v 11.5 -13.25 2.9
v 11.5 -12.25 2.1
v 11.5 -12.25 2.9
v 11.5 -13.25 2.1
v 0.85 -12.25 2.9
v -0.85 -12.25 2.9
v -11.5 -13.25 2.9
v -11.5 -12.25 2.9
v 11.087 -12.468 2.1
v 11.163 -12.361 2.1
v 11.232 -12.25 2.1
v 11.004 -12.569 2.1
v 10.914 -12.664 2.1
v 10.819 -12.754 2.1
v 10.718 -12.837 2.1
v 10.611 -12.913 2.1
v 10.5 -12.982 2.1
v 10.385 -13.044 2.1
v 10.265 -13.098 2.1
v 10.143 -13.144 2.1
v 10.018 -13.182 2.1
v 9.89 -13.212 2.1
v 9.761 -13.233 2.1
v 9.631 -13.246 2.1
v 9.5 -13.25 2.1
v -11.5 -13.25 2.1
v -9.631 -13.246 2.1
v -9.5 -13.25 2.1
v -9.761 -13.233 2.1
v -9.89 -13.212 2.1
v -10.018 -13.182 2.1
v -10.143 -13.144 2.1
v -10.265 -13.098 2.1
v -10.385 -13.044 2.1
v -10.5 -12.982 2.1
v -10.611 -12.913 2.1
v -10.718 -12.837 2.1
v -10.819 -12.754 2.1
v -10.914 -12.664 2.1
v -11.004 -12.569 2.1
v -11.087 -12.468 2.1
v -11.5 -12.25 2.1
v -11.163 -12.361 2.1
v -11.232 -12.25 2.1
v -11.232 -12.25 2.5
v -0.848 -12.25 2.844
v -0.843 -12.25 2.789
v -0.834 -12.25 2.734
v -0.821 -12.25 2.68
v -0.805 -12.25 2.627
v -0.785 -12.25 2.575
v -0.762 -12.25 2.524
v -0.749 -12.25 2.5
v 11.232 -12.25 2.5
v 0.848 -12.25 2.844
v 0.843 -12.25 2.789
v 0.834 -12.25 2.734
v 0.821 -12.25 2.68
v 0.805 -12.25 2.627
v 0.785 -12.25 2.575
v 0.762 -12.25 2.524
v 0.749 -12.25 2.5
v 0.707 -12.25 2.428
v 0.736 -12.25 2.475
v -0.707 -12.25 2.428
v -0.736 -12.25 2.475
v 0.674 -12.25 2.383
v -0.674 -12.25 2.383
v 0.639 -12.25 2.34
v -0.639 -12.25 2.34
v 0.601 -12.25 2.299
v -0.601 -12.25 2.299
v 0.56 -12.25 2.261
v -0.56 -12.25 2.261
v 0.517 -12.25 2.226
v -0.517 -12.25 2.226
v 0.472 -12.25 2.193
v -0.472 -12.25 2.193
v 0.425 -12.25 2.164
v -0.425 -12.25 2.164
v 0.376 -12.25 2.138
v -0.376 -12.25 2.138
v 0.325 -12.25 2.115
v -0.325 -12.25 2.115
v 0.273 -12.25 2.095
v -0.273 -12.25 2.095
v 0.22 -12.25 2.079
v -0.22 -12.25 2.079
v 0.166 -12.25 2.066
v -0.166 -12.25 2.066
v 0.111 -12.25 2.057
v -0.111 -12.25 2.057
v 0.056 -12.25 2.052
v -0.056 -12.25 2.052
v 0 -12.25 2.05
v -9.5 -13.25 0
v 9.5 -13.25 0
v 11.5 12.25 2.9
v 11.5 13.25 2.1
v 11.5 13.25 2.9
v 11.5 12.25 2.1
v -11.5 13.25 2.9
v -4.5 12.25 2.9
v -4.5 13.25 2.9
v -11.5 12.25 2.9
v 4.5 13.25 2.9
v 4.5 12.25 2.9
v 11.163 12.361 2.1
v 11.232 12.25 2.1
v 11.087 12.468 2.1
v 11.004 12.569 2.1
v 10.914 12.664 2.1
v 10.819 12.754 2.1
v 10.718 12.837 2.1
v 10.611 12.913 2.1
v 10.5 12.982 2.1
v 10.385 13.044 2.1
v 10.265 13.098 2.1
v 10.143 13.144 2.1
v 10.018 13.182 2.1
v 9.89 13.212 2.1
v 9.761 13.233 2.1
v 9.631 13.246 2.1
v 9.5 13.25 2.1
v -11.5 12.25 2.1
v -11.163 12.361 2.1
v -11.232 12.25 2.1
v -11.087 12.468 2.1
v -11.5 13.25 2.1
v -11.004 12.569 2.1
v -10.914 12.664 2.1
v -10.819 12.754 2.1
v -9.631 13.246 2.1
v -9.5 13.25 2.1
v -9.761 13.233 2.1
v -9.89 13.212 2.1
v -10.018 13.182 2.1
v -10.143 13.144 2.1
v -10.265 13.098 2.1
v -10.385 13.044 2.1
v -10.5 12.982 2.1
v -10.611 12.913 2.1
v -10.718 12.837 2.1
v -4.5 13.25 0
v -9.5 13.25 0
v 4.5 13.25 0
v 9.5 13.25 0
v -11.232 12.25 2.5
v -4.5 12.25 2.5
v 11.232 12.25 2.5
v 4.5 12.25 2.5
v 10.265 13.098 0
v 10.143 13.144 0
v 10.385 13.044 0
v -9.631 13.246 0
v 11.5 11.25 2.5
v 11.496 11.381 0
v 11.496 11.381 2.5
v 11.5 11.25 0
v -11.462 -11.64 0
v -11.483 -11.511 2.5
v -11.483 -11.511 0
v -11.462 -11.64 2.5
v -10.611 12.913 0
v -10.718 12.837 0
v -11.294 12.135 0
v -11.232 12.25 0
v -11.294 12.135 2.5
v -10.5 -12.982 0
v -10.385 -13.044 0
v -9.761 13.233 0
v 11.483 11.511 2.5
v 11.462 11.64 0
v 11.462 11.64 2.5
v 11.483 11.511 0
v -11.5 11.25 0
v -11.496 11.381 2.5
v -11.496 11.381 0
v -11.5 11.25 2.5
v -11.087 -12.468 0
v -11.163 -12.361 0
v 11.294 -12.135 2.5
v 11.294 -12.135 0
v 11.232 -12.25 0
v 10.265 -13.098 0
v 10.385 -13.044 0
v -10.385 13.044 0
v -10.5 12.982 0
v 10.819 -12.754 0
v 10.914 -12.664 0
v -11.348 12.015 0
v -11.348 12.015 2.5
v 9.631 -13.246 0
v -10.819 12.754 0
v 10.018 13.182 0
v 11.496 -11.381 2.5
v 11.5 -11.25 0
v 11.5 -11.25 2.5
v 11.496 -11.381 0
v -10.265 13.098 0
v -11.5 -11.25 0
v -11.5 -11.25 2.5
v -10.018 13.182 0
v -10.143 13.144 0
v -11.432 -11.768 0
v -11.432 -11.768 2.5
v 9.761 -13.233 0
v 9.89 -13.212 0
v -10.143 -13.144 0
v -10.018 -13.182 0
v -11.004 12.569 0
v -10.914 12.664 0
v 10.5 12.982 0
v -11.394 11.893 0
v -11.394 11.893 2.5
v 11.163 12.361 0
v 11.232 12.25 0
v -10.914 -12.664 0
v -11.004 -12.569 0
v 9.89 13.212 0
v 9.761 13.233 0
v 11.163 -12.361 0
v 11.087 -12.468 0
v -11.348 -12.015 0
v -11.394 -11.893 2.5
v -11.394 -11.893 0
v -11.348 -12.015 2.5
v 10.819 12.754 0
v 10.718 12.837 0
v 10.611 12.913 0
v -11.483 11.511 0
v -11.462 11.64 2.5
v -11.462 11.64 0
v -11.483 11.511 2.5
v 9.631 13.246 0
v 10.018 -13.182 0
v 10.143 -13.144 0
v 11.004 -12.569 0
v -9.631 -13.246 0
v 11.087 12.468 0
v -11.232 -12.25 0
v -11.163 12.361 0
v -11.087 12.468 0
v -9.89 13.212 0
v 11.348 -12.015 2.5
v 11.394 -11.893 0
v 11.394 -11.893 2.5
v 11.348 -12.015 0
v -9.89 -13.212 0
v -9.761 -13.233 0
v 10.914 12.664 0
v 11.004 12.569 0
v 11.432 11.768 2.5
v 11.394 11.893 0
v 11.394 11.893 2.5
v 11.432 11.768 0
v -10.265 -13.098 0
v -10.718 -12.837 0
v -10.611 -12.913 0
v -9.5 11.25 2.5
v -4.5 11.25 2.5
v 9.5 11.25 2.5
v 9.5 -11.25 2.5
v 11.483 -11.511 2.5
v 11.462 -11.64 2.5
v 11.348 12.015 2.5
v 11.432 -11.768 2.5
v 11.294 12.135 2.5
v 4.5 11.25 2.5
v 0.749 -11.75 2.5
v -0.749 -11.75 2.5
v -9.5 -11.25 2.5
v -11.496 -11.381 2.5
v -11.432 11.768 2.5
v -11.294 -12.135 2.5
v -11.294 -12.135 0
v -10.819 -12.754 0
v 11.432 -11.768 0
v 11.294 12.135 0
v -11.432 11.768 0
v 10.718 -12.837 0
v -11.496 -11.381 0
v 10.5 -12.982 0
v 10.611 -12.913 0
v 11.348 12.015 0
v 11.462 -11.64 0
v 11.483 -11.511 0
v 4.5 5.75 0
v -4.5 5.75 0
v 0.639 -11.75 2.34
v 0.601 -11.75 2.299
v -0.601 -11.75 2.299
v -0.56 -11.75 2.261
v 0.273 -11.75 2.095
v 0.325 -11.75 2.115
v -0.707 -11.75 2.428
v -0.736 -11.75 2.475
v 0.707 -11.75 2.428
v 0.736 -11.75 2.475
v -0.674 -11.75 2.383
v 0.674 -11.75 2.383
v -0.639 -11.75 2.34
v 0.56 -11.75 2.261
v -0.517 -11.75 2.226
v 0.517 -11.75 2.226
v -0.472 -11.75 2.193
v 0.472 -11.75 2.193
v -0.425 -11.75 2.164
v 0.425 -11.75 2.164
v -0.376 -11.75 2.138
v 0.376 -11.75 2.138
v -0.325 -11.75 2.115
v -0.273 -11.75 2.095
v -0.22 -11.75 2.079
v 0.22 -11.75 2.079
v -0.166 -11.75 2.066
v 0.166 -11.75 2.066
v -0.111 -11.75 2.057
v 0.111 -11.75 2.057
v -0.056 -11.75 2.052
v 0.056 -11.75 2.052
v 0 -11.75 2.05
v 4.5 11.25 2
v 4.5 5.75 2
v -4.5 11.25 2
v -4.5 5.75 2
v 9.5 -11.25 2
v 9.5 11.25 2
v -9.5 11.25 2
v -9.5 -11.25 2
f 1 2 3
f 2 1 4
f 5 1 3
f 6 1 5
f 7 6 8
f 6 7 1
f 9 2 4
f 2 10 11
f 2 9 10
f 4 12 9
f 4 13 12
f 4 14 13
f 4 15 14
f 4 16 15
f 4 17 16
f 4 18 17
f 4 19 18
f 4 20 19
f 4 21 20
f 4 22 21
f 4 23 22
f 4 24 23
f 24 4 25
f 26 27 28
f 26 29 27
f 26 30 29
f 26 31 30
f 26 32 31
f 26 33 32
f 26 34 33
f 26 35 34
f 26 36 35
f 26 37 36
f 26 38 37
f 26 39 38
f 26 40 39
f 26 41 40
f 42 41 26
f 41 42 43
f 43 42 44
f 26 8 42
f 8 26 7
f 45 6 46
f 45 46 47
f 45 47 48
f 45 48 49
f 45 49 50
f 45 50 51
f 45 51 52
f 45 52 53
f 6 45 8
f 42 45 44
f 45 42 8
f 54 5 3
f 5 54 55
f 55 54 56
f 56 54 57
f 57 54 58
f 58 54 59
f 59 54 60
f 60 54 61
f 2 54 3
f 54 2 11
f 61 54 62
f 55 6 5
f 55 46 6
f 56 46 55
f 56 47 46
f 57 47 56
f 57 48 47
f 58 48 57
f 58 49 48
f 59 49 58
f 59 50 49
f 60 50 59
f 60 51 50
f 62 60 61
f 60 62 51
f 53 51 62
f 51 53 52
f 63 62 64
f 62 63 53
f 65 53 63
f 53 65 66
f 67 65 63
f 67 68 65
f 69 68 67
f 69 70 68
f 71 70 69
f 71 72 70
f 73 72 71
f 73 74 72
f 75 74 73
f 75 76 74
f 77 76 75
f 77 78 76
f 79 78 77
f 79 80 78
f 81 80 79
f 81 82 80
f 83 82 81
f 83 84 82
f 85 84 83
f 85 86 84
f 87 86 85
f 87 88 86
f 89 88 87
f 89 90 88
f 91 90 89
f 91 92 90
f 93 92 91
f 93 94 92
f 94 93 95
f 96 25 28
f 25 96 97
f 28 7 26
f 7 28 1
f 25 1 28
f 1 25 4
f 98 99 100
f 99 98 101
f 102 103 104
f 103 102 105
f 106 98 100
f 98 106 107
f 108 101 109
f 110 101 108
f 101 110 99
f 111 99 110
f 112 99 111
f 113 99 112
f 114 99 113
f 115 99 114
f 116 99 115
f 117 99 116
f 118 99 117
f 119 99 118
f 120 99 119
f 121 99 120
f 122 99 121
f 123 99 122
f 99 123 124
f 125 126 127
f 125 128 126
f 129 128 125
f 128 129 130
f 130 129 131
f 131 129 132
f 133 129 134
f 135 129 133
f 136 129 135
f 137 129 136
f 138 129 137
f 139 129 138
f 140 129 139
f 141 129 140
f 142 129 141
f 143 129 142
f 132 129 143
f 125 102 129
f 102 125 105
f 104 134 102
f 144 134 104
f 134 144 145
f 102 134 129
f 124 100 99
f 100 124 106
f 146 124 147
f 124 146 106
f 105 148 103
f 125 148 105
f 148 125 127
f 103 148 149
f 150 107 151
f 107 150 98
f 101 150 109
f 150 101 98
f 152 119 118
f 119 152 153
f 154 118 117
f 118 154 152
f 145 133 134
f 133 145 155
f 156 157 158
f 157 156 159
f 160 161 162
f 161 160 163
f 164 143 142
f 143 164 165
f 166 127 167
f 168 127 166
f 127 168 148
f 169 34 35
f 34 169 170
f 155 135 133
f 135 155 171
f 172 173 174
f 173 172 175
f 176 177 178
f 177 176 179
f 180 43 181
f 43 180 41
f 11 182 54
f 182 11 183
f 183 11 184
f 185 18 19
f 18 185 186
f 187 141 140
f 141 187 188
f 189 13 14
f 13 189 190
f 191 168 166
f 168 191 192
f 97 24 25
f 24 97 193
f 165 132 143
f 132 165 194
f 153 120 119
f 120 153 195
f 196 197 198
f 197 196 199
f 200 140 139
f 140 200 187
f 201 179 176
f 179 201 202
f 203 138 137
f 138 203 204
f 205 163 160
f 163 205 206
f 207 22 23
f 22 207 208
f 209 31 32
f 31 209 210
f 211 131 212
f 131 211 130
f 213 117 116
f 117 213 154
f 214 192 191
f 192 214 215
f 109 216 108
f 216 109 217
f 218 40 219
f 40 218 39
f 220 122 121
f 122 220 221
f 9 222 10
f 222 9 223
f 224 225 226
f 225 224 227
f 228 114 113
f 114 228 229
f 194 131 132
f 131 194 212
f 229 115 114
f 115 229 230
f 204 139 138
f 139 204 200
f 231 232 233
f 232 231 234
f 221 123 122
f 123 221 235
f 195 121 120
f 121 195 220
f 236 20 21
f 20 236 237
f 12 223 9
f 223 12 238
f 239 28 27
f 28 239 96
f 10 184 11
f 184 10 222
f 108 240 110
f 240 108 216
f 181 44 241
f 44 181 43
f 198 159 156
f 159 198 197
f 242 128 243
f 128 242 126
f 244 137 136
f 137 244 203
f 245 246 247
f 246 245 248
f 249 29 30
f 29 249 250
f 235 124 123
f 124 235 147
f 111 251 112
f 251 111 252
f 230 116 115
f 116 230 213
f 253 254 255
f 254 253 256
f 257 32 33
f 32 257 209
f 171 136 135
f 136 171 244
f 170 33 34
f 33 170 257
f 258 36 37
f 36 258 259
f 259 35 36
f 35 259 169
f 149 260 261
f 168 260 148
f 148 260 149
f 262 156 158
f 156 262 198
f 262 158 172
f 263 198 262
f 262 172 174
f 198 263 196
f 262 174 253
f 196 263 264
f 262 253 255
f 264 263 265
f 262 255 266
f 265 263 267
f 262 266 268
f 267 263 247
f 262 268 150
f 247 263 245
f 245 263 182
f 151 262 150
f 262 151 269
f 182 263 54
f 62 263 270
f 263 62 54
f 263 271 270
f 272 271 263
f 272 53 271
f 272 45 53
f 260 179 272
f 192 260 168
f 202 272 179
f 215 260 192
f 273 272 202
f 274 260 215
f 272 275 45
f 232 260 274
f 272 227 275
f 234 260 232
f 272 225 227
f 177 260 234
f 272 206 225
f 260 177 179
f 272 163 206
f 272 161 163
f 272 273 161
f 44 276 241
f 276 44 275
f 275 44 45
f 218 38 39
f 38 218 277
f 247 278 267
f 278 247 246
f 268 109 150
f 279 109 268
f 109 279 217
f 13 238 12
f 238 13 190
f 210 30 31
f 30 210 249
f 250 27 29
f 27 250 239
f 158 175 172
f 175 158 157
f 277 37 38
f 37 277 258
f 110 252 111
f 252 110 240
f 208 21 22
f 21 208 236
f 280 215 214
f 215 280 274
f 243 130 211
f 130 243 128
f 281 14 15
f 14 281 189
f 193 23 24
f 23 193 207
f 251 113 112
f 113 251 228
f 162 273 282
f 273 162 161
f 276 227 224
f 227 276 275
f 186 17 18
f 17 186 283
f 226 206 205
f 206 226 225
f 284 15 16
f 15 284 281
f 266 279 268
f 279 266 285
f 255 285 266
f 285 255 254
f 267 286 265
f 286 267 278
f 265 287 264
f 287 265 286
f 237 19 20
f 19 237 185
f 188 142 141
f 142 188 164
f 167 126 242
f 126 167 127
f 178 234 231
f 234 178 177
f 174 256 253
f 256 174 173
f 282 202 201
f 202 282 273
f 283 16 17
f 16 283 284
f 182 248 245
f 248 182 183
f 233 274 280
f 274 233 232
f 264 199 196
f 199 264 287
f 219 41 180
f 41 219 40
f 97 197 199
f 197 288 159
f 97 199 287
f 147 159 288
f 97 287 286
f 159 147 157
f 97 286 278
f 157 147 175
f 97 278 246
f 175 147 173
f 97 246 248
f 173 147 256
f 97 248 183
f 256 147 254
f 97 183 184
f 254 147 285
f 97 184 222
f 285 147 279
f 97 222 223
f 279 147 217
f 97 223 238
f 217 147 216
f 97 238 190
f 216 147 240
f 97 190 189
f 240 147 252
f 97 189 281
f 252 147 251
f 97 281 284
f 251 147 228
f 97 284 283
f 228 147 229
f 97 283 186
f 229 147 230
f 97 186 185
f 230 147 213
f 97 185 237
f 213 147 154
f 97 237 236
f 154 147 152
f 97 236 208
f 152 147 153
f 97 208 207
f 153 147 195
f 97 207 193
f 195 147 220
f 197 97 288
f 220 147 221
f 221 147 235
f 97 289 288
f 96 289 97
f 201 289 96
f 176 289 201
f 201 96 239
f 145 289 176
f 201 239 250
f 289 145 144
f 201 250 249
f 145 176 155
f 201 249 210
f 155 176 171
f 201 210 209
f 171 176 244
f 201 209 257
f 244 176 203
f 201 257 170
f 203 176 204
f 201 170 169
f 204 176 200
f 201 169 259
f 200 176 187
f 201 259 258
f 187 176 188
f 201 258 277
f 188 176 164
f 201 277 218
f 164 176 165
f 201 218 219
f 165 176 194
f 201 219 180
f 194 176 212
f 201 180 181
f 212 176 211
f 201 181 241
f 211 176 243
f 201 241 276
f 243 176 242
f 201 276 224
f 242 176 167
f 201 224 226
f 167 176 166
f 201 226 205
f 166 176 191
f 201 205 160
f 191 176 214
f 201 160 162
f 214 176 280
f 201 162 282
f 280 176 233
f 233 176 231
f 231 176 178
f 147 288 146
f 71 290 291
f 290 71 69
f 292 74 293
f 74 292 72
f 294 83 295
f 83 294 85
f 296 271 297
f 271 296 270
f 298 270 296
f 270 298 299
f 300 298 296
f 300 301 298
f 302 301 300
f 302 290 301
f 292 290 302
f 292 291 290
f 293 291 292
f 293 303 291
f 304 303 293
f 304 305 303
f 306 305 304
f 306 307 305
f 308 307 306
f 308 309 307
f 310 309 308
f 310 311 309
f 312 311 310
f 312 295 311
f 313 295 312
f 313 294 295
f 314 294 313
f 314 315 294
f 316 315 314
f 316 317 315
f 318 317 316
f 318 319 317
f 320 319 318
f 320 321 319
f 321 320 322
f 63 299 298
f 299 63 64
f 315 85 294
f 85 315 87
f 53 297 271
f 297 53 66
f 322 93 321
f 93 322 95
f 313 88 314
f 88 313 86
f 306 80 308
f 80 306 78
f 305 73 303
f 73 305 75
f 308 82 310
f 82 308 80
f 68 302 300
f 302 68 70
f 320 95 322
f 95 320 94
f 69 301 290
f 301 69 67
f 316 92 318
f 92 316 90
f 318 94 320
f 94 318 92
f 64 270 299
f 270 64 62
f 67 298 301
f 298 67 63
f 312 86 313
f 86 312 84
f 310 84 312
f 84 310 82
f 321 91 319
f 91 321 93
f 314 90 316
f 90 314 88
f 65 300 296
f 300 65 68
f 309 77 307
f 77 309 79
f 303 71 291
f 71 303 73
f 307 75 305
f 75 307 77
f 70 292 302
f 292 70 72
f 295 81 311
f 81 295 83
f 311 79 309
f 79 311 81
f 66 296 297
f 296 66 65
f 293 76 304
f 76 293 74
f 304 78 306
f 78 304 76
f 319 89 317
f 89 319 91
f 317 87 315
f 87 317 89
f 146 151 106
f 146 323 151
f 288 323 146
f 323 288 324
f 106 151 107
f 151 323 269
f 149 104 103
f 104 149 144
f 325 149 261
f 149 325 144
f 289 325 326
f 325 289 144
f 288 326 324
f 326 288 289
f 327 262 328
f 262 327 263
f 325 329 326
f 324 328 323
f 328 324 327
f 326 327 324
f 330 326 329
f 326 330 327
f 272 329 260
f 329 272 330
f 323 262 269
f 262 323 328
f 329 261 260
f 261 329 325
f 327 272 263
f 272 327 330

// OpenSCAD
// =============================================================================
// charging_cradle.scad — CortiPod charging dock
//
// Same outer profile as the electrode tray (bottom shell). Slides into the
// same U-channel rails on the top shell underside. Instead of an electrode
// pocket, carries 4 gold-plated contact pads aligned with the pogo pin
// positions and a USB-C port on the exposed +Y face.
//
// Power path:
//   USB-C → cradle PCB → contact pads → pogo pins → main PCB → LiPo charger
//
// Pin assignment (cradle top face → pogo pin):
//   WE_MIP + WE_NIP → V+ (charge current)
//   CE + RE          → GND
//
// The internal trace_channel pocket seats the cradle PCB (0.8mm FR4).
// Wall margin is 2mm on all sides so the cradle body remains rigid.
//
// Print: contact-pad side UP for best surface finish on mating faces.
// =============================================================================

include <parameters.scad>

$fn = $preview ? 32 : 96;

// ---- Main module ----
module charging_cradle() {
    difference() {
        union() {
            cradle_body();
            cradle_lips();
        }
        usbc_port_slot();
        contact_pad_recesses();
        detent_recesses();
        trace_channel();
    }
}

// ---- Cradle body ----
// Identical to bottom_shell's tray_body: rounded-rect block at the tray
// footprint. Corner radius capped at 2.0mm to stay within the tray walls.
module cradle_body() {
    r = min(pod_corner_radius, 2.0);
    hull() {
        for (x = [-tray_width/2 + r, tray_width/2 - r])
            for (y = [-tray_length/2 + r, tray_length/2 - r])
                translate([x, y, 0])
                    cylinder(r=r, h=tray_height);
    }
}

// ---- Cradle lips ----
// Identical to bottom_shell's tray_lips. Thin protrusions on the ±Y edges
// that slide into the top shell U-channel rails.
module cradle_lips() {
    for (y_sign = [-1, 1]) {
        y_pos = y_sign * (tray_length/2 - tray_lip_thickness/2);
        translate([0, y_pos, tray_height])
            cube([tray_width, tray_lip_thickness, tray_lip_height], center=true);
    }
}

// ---- USB-C port slot ----
// Rectangular cutout on the +Y face to accept a USB-C receptacle body.
// Centered in X and vertically centered within the tray height.
module usbc_port_slot() {
    translate([-usbc_port_width/2,
               tray_length/2 - usbc_port_depth,
               (tray_height - usbc_port_height) / 2])
        cube([usbc_port_width, usbc_port_depth + 0.1, usbc_port_height]);
}

// ---- Contact pad recesses ----
// 4 shallow circular recesses (0.4mm deep) on the top face of the cradle,
// at the same XY positions as the pogo pin back contacts on the electrode.
// Diameter is cradle_pad_diameter + 0.5mm for generous contact area.
module contact_pad_recesses() {
    pad_d    = cradle_pad_diameter + 0.5;
    recess_h = 0.4;

    positions = [
        [contact_we_mip_x, contact_we_mip_y],
        [contact_we_nip_x, contact_we_nip_y],
        [contact_ce_x,     contact_ce_y    ],
        [contact_re_x,     contact_re_y    ]
    ];

    for (p = positions) {
        translate([p[0], p[1], tray_height - recess_h])
            cylinder(d=pad_d, h=recess_h + 0.1);
    }
}

// ---- Detent recesses ----
// Identical to bottom_shell's detent_recesses so the same top shell rails
// click-lock the cradle in the fully seated position.
module detent_recesses() {
    recess_d     = detent_bump_diameter + 0.2;
    recess_depth = detent_bump_height + 0.1;

    for (y_sign = [-1, 1]) {
        y_inner = y_sign * (tray_length/2 - tray_lip_thickness);
        translate([0,
                   y_inner,
                   tray_height + tray_lip_height/2])
            rotate([y_sign * 90, 0, 0])
                cylinder(d=recess_d, h=recess_depth + 0.1);
    }
}

// ---- Trace channel ----
// Internal pocket (0.8mm tall) for the cradle PCB, sitting just above the
// cradle floor. 2mm wall margin on all sides keeps the body structurally sound.
module trace_channel() {
    wall_margin = 2.0;
    ch_width  = tray_width  - wall_margin * 2;
    ch_length = tray_length - wall_margin * 2;
    ch_height = electrode_board_thickness;   // 0.8mm — matches PCB thickness

    translate([-ch_width/2, -ch_length/2, wall_margin])
        cube([ch_width, ch_length, ch_height + 0.1]);
}

// ---- Render ----
charging_cradle();
